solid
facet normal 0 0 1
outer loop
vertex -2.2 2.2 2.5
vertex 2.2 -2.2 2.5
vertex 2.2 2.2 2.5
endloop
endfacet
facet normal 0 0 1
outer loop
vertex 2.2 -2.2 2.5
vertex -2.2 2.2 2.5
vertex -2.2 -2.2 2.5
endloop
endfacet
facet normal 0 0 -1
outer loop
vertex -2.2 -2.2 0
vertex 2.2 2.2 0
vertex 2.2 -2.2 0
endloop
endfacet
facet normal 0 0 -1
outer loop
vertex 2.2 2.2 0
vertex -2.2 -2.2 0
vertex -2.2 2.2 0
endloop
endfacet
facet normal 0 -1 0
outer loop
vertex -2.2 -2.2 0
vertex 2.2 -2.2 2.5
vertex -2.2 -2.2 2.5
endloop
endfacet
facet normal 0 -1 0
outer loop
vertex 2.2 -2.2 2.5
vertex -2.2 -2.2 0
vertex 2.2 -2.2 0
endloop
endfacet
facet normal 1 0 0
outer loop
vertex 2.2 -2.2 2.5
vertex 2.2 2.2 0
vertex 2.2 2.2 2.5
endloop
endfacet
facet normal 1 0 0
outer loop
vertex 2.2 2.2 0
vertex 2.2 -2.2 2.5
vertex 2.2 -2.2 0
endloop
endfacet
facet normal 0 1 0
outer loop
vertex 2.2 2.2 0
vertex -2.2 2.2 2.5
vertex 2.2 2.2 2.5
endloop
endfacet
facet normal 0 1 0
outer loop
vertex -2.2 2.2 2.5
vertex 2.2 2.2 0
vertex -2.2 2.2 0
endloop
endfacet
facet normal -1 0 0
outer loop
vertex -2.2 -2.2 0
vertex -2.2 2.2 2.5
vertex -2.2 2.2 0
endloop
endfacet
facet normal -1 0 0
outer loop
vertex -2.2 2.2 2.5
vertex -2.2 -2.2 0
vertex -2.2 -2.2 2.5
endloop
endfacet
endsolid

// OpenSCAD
// file: ../settings.scad
/*
 *   Edit these settings to control the generated keycaps
 */

/* height of the part the finger rests on, doesn't exclude higher protrusions,
       eg. the saddle keycap rises on either side of the thumb for leverage */
effective_height=16+5;

// maximum width in any direction, strict limit to prevent collision with adjacent keycaps
total_width=16;

// how thick the keycap, excluding the stem, should be. mostly aesthetic preference?
minimum_thickness = 1;


keycap_style = "trackpoint-lp";

/* can be auto (computationally expensive), manual (a bit janky, needs to be implemented for each keycap), or none.
     has no effect on certain keycaps such as trackpoint variants */
chamfer_style = "auto";

/* this allows you to rotate the keycap if the finger approaches at an angle
   you probably only want to rotate the Z-axis (third value) */
keycap_rotation = [0,0,0];


stem_model = "trackpoint-lp-square";


/* -----------------------------------------------------------------------
 *  Do Not Edit - this machinery is consistent regardless of above values
 * -----------------------------------------------------------------------
 */

function auto_chamfer() = chamfer_style == "auto";

function manual_chamfer() = chamfer_style == "manual";
// main file
/*
 *  A mount for a full-sized Trackpoint rubber cap
 */

// ignores minimum_thickness, chamfer_style, etc so this isn't really needed atm
include <../settings.scad>;

vertical_slop = 0.1;
inner_slop = 0.1;
outer_slop = 0.1;


// I've seen both 6mm and 5mm tall caps, but the 6mm tend to come off when used as a thumbstick
function height_offset() = 5;

side = 4.5;
height = 2.5;

// this alias is for using when making a hole for a stem
module cap_trackpoint(stem=true) {
  adjusted_side = stem ? side + inner_slop : side - outer_slop;
  translate([0,0,height/2]) cube([adjusted_side,adjusted_side,height],true);
}

// this is for using as a cap
module cap() {
  cap_trackpoint(stem=false);
}

cap($fn=12);
